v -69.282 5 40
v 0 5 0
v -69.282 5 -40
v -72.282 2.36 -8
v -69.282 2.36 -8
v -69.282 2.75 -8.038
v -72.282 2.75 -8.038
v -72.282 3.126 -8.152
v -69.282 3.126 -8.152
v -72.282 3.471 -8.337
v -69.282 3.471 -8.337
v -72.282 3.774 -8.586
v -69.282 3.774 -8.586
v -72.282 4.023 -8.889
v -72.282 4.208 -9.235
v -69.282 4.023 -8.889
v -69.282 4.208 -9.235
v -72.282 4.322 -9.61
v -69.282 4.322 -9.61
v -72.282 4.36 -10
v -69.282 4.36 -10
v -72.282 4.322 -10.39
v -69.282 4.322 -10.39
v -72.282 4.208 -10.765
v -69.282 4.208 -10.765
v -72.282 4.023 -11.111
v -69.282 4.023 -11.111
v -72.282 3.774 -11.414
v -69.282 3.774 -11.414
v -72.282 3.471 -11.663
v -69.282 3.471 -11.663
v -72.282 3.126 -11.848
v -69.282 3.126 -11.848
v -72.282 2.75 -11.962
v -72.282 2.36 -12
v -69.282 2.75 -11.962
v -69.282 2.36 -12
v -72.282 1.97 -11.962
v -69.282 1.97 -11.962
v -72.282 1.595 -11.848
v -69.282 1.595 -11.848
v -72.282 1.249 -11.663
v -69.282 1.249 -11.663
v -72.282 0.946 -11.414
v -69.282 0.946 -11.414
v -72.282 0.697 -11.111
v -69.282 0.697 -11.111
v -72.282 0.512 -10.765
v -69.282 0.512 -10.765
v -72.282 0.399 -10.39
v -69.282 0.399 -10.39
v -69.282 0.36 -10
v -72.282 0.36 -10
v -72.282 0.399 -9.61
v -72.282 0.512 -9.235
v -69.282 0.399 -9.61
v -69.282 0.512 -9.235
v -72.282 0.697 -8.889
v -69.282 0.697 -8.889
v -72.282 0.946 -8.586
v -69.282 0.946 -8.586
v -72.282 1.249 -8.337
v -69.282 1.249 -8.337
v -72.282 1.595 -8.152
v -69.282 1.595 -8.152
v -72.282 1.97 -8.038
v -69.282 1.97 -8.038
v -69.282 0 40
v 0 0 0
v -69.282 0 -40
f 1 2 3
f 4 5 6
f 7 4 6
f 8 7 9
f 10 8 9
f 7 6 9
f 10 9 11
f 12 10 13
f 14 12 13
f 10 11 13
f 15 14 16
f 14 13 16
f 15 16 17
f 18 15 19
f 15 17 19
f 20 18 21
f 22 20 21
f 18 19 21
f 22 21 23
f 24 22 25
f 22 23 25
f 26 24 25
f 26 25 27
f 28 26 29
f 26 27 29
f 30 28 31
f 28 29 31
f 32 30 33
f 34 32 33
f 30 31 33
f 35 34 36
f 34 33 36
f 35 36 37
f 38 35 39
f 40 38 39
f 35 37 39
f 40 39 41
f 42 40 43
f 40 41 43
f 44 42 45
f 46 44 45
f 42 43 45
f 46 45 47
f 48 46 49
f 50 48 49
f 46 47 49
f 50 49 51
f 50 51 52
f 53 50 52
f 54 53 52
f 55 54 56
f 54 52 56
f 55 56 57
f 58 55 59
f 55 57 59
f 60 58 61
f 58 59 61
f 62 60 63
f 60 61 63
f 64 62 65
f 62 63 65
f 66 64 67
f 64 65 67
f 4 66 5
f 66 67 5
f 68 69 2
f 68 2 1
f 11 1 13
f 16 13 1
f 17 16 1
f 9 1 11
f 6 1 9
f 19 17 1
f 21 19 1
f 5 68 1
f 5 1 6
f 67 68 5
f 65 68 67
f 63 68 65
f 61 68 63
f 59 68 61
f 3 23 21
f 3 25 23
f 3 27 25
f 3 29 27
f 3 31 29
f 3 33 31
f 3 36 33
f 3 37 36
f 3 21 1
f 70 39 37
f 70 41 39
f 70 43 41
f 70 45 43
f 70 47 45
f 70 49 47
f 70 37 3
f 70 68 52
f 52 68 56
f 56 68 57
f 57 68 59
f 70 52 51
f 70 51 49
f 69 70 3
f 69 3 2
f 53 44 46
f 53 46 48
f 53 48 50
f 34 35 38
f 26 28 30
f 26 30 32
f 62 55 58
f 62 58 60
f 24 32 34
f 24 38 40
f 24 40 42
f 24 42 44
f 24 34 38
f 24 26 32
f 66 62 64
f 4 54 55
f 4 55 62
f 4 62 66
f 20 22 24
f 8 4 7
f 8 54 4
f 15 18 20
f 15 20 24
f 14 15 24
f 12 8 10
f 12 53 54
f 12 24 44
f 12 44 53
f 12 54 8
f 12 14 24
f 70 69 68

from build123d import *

# Parameters (mm, degrees)
BOSS_EXTRUDE1_DEPTH = 5
SKETCH2_R           = 2
BOSS_EXTRUDE2_DEPTH = 3


with BuildPart() as part:
    # Sketch1 → Boss-Extrude1 (new body)
    with BuildSketch(Plane(origin=(0, 0, 0), x_dir=(1, 0, 0), z_dir=(0, 1, 0))):
        Polygon((-69.282032303, 40), (0, 0), (-69.282032303, -40), align=None)
    extrude(amount=BOSS_EXTRUDE1_DEPTH)

    # Sketch2 → Boss-Extrude2 (add)
    with BuildSketch(Plane.ZY.offset(69.282032303)):
        with Locations((-10, 2.360160214)):
            Circle(SKETCH2_R)
    extrude(amount=BOSS_EXTRUDE2_DEPTH)


solid = part.part
